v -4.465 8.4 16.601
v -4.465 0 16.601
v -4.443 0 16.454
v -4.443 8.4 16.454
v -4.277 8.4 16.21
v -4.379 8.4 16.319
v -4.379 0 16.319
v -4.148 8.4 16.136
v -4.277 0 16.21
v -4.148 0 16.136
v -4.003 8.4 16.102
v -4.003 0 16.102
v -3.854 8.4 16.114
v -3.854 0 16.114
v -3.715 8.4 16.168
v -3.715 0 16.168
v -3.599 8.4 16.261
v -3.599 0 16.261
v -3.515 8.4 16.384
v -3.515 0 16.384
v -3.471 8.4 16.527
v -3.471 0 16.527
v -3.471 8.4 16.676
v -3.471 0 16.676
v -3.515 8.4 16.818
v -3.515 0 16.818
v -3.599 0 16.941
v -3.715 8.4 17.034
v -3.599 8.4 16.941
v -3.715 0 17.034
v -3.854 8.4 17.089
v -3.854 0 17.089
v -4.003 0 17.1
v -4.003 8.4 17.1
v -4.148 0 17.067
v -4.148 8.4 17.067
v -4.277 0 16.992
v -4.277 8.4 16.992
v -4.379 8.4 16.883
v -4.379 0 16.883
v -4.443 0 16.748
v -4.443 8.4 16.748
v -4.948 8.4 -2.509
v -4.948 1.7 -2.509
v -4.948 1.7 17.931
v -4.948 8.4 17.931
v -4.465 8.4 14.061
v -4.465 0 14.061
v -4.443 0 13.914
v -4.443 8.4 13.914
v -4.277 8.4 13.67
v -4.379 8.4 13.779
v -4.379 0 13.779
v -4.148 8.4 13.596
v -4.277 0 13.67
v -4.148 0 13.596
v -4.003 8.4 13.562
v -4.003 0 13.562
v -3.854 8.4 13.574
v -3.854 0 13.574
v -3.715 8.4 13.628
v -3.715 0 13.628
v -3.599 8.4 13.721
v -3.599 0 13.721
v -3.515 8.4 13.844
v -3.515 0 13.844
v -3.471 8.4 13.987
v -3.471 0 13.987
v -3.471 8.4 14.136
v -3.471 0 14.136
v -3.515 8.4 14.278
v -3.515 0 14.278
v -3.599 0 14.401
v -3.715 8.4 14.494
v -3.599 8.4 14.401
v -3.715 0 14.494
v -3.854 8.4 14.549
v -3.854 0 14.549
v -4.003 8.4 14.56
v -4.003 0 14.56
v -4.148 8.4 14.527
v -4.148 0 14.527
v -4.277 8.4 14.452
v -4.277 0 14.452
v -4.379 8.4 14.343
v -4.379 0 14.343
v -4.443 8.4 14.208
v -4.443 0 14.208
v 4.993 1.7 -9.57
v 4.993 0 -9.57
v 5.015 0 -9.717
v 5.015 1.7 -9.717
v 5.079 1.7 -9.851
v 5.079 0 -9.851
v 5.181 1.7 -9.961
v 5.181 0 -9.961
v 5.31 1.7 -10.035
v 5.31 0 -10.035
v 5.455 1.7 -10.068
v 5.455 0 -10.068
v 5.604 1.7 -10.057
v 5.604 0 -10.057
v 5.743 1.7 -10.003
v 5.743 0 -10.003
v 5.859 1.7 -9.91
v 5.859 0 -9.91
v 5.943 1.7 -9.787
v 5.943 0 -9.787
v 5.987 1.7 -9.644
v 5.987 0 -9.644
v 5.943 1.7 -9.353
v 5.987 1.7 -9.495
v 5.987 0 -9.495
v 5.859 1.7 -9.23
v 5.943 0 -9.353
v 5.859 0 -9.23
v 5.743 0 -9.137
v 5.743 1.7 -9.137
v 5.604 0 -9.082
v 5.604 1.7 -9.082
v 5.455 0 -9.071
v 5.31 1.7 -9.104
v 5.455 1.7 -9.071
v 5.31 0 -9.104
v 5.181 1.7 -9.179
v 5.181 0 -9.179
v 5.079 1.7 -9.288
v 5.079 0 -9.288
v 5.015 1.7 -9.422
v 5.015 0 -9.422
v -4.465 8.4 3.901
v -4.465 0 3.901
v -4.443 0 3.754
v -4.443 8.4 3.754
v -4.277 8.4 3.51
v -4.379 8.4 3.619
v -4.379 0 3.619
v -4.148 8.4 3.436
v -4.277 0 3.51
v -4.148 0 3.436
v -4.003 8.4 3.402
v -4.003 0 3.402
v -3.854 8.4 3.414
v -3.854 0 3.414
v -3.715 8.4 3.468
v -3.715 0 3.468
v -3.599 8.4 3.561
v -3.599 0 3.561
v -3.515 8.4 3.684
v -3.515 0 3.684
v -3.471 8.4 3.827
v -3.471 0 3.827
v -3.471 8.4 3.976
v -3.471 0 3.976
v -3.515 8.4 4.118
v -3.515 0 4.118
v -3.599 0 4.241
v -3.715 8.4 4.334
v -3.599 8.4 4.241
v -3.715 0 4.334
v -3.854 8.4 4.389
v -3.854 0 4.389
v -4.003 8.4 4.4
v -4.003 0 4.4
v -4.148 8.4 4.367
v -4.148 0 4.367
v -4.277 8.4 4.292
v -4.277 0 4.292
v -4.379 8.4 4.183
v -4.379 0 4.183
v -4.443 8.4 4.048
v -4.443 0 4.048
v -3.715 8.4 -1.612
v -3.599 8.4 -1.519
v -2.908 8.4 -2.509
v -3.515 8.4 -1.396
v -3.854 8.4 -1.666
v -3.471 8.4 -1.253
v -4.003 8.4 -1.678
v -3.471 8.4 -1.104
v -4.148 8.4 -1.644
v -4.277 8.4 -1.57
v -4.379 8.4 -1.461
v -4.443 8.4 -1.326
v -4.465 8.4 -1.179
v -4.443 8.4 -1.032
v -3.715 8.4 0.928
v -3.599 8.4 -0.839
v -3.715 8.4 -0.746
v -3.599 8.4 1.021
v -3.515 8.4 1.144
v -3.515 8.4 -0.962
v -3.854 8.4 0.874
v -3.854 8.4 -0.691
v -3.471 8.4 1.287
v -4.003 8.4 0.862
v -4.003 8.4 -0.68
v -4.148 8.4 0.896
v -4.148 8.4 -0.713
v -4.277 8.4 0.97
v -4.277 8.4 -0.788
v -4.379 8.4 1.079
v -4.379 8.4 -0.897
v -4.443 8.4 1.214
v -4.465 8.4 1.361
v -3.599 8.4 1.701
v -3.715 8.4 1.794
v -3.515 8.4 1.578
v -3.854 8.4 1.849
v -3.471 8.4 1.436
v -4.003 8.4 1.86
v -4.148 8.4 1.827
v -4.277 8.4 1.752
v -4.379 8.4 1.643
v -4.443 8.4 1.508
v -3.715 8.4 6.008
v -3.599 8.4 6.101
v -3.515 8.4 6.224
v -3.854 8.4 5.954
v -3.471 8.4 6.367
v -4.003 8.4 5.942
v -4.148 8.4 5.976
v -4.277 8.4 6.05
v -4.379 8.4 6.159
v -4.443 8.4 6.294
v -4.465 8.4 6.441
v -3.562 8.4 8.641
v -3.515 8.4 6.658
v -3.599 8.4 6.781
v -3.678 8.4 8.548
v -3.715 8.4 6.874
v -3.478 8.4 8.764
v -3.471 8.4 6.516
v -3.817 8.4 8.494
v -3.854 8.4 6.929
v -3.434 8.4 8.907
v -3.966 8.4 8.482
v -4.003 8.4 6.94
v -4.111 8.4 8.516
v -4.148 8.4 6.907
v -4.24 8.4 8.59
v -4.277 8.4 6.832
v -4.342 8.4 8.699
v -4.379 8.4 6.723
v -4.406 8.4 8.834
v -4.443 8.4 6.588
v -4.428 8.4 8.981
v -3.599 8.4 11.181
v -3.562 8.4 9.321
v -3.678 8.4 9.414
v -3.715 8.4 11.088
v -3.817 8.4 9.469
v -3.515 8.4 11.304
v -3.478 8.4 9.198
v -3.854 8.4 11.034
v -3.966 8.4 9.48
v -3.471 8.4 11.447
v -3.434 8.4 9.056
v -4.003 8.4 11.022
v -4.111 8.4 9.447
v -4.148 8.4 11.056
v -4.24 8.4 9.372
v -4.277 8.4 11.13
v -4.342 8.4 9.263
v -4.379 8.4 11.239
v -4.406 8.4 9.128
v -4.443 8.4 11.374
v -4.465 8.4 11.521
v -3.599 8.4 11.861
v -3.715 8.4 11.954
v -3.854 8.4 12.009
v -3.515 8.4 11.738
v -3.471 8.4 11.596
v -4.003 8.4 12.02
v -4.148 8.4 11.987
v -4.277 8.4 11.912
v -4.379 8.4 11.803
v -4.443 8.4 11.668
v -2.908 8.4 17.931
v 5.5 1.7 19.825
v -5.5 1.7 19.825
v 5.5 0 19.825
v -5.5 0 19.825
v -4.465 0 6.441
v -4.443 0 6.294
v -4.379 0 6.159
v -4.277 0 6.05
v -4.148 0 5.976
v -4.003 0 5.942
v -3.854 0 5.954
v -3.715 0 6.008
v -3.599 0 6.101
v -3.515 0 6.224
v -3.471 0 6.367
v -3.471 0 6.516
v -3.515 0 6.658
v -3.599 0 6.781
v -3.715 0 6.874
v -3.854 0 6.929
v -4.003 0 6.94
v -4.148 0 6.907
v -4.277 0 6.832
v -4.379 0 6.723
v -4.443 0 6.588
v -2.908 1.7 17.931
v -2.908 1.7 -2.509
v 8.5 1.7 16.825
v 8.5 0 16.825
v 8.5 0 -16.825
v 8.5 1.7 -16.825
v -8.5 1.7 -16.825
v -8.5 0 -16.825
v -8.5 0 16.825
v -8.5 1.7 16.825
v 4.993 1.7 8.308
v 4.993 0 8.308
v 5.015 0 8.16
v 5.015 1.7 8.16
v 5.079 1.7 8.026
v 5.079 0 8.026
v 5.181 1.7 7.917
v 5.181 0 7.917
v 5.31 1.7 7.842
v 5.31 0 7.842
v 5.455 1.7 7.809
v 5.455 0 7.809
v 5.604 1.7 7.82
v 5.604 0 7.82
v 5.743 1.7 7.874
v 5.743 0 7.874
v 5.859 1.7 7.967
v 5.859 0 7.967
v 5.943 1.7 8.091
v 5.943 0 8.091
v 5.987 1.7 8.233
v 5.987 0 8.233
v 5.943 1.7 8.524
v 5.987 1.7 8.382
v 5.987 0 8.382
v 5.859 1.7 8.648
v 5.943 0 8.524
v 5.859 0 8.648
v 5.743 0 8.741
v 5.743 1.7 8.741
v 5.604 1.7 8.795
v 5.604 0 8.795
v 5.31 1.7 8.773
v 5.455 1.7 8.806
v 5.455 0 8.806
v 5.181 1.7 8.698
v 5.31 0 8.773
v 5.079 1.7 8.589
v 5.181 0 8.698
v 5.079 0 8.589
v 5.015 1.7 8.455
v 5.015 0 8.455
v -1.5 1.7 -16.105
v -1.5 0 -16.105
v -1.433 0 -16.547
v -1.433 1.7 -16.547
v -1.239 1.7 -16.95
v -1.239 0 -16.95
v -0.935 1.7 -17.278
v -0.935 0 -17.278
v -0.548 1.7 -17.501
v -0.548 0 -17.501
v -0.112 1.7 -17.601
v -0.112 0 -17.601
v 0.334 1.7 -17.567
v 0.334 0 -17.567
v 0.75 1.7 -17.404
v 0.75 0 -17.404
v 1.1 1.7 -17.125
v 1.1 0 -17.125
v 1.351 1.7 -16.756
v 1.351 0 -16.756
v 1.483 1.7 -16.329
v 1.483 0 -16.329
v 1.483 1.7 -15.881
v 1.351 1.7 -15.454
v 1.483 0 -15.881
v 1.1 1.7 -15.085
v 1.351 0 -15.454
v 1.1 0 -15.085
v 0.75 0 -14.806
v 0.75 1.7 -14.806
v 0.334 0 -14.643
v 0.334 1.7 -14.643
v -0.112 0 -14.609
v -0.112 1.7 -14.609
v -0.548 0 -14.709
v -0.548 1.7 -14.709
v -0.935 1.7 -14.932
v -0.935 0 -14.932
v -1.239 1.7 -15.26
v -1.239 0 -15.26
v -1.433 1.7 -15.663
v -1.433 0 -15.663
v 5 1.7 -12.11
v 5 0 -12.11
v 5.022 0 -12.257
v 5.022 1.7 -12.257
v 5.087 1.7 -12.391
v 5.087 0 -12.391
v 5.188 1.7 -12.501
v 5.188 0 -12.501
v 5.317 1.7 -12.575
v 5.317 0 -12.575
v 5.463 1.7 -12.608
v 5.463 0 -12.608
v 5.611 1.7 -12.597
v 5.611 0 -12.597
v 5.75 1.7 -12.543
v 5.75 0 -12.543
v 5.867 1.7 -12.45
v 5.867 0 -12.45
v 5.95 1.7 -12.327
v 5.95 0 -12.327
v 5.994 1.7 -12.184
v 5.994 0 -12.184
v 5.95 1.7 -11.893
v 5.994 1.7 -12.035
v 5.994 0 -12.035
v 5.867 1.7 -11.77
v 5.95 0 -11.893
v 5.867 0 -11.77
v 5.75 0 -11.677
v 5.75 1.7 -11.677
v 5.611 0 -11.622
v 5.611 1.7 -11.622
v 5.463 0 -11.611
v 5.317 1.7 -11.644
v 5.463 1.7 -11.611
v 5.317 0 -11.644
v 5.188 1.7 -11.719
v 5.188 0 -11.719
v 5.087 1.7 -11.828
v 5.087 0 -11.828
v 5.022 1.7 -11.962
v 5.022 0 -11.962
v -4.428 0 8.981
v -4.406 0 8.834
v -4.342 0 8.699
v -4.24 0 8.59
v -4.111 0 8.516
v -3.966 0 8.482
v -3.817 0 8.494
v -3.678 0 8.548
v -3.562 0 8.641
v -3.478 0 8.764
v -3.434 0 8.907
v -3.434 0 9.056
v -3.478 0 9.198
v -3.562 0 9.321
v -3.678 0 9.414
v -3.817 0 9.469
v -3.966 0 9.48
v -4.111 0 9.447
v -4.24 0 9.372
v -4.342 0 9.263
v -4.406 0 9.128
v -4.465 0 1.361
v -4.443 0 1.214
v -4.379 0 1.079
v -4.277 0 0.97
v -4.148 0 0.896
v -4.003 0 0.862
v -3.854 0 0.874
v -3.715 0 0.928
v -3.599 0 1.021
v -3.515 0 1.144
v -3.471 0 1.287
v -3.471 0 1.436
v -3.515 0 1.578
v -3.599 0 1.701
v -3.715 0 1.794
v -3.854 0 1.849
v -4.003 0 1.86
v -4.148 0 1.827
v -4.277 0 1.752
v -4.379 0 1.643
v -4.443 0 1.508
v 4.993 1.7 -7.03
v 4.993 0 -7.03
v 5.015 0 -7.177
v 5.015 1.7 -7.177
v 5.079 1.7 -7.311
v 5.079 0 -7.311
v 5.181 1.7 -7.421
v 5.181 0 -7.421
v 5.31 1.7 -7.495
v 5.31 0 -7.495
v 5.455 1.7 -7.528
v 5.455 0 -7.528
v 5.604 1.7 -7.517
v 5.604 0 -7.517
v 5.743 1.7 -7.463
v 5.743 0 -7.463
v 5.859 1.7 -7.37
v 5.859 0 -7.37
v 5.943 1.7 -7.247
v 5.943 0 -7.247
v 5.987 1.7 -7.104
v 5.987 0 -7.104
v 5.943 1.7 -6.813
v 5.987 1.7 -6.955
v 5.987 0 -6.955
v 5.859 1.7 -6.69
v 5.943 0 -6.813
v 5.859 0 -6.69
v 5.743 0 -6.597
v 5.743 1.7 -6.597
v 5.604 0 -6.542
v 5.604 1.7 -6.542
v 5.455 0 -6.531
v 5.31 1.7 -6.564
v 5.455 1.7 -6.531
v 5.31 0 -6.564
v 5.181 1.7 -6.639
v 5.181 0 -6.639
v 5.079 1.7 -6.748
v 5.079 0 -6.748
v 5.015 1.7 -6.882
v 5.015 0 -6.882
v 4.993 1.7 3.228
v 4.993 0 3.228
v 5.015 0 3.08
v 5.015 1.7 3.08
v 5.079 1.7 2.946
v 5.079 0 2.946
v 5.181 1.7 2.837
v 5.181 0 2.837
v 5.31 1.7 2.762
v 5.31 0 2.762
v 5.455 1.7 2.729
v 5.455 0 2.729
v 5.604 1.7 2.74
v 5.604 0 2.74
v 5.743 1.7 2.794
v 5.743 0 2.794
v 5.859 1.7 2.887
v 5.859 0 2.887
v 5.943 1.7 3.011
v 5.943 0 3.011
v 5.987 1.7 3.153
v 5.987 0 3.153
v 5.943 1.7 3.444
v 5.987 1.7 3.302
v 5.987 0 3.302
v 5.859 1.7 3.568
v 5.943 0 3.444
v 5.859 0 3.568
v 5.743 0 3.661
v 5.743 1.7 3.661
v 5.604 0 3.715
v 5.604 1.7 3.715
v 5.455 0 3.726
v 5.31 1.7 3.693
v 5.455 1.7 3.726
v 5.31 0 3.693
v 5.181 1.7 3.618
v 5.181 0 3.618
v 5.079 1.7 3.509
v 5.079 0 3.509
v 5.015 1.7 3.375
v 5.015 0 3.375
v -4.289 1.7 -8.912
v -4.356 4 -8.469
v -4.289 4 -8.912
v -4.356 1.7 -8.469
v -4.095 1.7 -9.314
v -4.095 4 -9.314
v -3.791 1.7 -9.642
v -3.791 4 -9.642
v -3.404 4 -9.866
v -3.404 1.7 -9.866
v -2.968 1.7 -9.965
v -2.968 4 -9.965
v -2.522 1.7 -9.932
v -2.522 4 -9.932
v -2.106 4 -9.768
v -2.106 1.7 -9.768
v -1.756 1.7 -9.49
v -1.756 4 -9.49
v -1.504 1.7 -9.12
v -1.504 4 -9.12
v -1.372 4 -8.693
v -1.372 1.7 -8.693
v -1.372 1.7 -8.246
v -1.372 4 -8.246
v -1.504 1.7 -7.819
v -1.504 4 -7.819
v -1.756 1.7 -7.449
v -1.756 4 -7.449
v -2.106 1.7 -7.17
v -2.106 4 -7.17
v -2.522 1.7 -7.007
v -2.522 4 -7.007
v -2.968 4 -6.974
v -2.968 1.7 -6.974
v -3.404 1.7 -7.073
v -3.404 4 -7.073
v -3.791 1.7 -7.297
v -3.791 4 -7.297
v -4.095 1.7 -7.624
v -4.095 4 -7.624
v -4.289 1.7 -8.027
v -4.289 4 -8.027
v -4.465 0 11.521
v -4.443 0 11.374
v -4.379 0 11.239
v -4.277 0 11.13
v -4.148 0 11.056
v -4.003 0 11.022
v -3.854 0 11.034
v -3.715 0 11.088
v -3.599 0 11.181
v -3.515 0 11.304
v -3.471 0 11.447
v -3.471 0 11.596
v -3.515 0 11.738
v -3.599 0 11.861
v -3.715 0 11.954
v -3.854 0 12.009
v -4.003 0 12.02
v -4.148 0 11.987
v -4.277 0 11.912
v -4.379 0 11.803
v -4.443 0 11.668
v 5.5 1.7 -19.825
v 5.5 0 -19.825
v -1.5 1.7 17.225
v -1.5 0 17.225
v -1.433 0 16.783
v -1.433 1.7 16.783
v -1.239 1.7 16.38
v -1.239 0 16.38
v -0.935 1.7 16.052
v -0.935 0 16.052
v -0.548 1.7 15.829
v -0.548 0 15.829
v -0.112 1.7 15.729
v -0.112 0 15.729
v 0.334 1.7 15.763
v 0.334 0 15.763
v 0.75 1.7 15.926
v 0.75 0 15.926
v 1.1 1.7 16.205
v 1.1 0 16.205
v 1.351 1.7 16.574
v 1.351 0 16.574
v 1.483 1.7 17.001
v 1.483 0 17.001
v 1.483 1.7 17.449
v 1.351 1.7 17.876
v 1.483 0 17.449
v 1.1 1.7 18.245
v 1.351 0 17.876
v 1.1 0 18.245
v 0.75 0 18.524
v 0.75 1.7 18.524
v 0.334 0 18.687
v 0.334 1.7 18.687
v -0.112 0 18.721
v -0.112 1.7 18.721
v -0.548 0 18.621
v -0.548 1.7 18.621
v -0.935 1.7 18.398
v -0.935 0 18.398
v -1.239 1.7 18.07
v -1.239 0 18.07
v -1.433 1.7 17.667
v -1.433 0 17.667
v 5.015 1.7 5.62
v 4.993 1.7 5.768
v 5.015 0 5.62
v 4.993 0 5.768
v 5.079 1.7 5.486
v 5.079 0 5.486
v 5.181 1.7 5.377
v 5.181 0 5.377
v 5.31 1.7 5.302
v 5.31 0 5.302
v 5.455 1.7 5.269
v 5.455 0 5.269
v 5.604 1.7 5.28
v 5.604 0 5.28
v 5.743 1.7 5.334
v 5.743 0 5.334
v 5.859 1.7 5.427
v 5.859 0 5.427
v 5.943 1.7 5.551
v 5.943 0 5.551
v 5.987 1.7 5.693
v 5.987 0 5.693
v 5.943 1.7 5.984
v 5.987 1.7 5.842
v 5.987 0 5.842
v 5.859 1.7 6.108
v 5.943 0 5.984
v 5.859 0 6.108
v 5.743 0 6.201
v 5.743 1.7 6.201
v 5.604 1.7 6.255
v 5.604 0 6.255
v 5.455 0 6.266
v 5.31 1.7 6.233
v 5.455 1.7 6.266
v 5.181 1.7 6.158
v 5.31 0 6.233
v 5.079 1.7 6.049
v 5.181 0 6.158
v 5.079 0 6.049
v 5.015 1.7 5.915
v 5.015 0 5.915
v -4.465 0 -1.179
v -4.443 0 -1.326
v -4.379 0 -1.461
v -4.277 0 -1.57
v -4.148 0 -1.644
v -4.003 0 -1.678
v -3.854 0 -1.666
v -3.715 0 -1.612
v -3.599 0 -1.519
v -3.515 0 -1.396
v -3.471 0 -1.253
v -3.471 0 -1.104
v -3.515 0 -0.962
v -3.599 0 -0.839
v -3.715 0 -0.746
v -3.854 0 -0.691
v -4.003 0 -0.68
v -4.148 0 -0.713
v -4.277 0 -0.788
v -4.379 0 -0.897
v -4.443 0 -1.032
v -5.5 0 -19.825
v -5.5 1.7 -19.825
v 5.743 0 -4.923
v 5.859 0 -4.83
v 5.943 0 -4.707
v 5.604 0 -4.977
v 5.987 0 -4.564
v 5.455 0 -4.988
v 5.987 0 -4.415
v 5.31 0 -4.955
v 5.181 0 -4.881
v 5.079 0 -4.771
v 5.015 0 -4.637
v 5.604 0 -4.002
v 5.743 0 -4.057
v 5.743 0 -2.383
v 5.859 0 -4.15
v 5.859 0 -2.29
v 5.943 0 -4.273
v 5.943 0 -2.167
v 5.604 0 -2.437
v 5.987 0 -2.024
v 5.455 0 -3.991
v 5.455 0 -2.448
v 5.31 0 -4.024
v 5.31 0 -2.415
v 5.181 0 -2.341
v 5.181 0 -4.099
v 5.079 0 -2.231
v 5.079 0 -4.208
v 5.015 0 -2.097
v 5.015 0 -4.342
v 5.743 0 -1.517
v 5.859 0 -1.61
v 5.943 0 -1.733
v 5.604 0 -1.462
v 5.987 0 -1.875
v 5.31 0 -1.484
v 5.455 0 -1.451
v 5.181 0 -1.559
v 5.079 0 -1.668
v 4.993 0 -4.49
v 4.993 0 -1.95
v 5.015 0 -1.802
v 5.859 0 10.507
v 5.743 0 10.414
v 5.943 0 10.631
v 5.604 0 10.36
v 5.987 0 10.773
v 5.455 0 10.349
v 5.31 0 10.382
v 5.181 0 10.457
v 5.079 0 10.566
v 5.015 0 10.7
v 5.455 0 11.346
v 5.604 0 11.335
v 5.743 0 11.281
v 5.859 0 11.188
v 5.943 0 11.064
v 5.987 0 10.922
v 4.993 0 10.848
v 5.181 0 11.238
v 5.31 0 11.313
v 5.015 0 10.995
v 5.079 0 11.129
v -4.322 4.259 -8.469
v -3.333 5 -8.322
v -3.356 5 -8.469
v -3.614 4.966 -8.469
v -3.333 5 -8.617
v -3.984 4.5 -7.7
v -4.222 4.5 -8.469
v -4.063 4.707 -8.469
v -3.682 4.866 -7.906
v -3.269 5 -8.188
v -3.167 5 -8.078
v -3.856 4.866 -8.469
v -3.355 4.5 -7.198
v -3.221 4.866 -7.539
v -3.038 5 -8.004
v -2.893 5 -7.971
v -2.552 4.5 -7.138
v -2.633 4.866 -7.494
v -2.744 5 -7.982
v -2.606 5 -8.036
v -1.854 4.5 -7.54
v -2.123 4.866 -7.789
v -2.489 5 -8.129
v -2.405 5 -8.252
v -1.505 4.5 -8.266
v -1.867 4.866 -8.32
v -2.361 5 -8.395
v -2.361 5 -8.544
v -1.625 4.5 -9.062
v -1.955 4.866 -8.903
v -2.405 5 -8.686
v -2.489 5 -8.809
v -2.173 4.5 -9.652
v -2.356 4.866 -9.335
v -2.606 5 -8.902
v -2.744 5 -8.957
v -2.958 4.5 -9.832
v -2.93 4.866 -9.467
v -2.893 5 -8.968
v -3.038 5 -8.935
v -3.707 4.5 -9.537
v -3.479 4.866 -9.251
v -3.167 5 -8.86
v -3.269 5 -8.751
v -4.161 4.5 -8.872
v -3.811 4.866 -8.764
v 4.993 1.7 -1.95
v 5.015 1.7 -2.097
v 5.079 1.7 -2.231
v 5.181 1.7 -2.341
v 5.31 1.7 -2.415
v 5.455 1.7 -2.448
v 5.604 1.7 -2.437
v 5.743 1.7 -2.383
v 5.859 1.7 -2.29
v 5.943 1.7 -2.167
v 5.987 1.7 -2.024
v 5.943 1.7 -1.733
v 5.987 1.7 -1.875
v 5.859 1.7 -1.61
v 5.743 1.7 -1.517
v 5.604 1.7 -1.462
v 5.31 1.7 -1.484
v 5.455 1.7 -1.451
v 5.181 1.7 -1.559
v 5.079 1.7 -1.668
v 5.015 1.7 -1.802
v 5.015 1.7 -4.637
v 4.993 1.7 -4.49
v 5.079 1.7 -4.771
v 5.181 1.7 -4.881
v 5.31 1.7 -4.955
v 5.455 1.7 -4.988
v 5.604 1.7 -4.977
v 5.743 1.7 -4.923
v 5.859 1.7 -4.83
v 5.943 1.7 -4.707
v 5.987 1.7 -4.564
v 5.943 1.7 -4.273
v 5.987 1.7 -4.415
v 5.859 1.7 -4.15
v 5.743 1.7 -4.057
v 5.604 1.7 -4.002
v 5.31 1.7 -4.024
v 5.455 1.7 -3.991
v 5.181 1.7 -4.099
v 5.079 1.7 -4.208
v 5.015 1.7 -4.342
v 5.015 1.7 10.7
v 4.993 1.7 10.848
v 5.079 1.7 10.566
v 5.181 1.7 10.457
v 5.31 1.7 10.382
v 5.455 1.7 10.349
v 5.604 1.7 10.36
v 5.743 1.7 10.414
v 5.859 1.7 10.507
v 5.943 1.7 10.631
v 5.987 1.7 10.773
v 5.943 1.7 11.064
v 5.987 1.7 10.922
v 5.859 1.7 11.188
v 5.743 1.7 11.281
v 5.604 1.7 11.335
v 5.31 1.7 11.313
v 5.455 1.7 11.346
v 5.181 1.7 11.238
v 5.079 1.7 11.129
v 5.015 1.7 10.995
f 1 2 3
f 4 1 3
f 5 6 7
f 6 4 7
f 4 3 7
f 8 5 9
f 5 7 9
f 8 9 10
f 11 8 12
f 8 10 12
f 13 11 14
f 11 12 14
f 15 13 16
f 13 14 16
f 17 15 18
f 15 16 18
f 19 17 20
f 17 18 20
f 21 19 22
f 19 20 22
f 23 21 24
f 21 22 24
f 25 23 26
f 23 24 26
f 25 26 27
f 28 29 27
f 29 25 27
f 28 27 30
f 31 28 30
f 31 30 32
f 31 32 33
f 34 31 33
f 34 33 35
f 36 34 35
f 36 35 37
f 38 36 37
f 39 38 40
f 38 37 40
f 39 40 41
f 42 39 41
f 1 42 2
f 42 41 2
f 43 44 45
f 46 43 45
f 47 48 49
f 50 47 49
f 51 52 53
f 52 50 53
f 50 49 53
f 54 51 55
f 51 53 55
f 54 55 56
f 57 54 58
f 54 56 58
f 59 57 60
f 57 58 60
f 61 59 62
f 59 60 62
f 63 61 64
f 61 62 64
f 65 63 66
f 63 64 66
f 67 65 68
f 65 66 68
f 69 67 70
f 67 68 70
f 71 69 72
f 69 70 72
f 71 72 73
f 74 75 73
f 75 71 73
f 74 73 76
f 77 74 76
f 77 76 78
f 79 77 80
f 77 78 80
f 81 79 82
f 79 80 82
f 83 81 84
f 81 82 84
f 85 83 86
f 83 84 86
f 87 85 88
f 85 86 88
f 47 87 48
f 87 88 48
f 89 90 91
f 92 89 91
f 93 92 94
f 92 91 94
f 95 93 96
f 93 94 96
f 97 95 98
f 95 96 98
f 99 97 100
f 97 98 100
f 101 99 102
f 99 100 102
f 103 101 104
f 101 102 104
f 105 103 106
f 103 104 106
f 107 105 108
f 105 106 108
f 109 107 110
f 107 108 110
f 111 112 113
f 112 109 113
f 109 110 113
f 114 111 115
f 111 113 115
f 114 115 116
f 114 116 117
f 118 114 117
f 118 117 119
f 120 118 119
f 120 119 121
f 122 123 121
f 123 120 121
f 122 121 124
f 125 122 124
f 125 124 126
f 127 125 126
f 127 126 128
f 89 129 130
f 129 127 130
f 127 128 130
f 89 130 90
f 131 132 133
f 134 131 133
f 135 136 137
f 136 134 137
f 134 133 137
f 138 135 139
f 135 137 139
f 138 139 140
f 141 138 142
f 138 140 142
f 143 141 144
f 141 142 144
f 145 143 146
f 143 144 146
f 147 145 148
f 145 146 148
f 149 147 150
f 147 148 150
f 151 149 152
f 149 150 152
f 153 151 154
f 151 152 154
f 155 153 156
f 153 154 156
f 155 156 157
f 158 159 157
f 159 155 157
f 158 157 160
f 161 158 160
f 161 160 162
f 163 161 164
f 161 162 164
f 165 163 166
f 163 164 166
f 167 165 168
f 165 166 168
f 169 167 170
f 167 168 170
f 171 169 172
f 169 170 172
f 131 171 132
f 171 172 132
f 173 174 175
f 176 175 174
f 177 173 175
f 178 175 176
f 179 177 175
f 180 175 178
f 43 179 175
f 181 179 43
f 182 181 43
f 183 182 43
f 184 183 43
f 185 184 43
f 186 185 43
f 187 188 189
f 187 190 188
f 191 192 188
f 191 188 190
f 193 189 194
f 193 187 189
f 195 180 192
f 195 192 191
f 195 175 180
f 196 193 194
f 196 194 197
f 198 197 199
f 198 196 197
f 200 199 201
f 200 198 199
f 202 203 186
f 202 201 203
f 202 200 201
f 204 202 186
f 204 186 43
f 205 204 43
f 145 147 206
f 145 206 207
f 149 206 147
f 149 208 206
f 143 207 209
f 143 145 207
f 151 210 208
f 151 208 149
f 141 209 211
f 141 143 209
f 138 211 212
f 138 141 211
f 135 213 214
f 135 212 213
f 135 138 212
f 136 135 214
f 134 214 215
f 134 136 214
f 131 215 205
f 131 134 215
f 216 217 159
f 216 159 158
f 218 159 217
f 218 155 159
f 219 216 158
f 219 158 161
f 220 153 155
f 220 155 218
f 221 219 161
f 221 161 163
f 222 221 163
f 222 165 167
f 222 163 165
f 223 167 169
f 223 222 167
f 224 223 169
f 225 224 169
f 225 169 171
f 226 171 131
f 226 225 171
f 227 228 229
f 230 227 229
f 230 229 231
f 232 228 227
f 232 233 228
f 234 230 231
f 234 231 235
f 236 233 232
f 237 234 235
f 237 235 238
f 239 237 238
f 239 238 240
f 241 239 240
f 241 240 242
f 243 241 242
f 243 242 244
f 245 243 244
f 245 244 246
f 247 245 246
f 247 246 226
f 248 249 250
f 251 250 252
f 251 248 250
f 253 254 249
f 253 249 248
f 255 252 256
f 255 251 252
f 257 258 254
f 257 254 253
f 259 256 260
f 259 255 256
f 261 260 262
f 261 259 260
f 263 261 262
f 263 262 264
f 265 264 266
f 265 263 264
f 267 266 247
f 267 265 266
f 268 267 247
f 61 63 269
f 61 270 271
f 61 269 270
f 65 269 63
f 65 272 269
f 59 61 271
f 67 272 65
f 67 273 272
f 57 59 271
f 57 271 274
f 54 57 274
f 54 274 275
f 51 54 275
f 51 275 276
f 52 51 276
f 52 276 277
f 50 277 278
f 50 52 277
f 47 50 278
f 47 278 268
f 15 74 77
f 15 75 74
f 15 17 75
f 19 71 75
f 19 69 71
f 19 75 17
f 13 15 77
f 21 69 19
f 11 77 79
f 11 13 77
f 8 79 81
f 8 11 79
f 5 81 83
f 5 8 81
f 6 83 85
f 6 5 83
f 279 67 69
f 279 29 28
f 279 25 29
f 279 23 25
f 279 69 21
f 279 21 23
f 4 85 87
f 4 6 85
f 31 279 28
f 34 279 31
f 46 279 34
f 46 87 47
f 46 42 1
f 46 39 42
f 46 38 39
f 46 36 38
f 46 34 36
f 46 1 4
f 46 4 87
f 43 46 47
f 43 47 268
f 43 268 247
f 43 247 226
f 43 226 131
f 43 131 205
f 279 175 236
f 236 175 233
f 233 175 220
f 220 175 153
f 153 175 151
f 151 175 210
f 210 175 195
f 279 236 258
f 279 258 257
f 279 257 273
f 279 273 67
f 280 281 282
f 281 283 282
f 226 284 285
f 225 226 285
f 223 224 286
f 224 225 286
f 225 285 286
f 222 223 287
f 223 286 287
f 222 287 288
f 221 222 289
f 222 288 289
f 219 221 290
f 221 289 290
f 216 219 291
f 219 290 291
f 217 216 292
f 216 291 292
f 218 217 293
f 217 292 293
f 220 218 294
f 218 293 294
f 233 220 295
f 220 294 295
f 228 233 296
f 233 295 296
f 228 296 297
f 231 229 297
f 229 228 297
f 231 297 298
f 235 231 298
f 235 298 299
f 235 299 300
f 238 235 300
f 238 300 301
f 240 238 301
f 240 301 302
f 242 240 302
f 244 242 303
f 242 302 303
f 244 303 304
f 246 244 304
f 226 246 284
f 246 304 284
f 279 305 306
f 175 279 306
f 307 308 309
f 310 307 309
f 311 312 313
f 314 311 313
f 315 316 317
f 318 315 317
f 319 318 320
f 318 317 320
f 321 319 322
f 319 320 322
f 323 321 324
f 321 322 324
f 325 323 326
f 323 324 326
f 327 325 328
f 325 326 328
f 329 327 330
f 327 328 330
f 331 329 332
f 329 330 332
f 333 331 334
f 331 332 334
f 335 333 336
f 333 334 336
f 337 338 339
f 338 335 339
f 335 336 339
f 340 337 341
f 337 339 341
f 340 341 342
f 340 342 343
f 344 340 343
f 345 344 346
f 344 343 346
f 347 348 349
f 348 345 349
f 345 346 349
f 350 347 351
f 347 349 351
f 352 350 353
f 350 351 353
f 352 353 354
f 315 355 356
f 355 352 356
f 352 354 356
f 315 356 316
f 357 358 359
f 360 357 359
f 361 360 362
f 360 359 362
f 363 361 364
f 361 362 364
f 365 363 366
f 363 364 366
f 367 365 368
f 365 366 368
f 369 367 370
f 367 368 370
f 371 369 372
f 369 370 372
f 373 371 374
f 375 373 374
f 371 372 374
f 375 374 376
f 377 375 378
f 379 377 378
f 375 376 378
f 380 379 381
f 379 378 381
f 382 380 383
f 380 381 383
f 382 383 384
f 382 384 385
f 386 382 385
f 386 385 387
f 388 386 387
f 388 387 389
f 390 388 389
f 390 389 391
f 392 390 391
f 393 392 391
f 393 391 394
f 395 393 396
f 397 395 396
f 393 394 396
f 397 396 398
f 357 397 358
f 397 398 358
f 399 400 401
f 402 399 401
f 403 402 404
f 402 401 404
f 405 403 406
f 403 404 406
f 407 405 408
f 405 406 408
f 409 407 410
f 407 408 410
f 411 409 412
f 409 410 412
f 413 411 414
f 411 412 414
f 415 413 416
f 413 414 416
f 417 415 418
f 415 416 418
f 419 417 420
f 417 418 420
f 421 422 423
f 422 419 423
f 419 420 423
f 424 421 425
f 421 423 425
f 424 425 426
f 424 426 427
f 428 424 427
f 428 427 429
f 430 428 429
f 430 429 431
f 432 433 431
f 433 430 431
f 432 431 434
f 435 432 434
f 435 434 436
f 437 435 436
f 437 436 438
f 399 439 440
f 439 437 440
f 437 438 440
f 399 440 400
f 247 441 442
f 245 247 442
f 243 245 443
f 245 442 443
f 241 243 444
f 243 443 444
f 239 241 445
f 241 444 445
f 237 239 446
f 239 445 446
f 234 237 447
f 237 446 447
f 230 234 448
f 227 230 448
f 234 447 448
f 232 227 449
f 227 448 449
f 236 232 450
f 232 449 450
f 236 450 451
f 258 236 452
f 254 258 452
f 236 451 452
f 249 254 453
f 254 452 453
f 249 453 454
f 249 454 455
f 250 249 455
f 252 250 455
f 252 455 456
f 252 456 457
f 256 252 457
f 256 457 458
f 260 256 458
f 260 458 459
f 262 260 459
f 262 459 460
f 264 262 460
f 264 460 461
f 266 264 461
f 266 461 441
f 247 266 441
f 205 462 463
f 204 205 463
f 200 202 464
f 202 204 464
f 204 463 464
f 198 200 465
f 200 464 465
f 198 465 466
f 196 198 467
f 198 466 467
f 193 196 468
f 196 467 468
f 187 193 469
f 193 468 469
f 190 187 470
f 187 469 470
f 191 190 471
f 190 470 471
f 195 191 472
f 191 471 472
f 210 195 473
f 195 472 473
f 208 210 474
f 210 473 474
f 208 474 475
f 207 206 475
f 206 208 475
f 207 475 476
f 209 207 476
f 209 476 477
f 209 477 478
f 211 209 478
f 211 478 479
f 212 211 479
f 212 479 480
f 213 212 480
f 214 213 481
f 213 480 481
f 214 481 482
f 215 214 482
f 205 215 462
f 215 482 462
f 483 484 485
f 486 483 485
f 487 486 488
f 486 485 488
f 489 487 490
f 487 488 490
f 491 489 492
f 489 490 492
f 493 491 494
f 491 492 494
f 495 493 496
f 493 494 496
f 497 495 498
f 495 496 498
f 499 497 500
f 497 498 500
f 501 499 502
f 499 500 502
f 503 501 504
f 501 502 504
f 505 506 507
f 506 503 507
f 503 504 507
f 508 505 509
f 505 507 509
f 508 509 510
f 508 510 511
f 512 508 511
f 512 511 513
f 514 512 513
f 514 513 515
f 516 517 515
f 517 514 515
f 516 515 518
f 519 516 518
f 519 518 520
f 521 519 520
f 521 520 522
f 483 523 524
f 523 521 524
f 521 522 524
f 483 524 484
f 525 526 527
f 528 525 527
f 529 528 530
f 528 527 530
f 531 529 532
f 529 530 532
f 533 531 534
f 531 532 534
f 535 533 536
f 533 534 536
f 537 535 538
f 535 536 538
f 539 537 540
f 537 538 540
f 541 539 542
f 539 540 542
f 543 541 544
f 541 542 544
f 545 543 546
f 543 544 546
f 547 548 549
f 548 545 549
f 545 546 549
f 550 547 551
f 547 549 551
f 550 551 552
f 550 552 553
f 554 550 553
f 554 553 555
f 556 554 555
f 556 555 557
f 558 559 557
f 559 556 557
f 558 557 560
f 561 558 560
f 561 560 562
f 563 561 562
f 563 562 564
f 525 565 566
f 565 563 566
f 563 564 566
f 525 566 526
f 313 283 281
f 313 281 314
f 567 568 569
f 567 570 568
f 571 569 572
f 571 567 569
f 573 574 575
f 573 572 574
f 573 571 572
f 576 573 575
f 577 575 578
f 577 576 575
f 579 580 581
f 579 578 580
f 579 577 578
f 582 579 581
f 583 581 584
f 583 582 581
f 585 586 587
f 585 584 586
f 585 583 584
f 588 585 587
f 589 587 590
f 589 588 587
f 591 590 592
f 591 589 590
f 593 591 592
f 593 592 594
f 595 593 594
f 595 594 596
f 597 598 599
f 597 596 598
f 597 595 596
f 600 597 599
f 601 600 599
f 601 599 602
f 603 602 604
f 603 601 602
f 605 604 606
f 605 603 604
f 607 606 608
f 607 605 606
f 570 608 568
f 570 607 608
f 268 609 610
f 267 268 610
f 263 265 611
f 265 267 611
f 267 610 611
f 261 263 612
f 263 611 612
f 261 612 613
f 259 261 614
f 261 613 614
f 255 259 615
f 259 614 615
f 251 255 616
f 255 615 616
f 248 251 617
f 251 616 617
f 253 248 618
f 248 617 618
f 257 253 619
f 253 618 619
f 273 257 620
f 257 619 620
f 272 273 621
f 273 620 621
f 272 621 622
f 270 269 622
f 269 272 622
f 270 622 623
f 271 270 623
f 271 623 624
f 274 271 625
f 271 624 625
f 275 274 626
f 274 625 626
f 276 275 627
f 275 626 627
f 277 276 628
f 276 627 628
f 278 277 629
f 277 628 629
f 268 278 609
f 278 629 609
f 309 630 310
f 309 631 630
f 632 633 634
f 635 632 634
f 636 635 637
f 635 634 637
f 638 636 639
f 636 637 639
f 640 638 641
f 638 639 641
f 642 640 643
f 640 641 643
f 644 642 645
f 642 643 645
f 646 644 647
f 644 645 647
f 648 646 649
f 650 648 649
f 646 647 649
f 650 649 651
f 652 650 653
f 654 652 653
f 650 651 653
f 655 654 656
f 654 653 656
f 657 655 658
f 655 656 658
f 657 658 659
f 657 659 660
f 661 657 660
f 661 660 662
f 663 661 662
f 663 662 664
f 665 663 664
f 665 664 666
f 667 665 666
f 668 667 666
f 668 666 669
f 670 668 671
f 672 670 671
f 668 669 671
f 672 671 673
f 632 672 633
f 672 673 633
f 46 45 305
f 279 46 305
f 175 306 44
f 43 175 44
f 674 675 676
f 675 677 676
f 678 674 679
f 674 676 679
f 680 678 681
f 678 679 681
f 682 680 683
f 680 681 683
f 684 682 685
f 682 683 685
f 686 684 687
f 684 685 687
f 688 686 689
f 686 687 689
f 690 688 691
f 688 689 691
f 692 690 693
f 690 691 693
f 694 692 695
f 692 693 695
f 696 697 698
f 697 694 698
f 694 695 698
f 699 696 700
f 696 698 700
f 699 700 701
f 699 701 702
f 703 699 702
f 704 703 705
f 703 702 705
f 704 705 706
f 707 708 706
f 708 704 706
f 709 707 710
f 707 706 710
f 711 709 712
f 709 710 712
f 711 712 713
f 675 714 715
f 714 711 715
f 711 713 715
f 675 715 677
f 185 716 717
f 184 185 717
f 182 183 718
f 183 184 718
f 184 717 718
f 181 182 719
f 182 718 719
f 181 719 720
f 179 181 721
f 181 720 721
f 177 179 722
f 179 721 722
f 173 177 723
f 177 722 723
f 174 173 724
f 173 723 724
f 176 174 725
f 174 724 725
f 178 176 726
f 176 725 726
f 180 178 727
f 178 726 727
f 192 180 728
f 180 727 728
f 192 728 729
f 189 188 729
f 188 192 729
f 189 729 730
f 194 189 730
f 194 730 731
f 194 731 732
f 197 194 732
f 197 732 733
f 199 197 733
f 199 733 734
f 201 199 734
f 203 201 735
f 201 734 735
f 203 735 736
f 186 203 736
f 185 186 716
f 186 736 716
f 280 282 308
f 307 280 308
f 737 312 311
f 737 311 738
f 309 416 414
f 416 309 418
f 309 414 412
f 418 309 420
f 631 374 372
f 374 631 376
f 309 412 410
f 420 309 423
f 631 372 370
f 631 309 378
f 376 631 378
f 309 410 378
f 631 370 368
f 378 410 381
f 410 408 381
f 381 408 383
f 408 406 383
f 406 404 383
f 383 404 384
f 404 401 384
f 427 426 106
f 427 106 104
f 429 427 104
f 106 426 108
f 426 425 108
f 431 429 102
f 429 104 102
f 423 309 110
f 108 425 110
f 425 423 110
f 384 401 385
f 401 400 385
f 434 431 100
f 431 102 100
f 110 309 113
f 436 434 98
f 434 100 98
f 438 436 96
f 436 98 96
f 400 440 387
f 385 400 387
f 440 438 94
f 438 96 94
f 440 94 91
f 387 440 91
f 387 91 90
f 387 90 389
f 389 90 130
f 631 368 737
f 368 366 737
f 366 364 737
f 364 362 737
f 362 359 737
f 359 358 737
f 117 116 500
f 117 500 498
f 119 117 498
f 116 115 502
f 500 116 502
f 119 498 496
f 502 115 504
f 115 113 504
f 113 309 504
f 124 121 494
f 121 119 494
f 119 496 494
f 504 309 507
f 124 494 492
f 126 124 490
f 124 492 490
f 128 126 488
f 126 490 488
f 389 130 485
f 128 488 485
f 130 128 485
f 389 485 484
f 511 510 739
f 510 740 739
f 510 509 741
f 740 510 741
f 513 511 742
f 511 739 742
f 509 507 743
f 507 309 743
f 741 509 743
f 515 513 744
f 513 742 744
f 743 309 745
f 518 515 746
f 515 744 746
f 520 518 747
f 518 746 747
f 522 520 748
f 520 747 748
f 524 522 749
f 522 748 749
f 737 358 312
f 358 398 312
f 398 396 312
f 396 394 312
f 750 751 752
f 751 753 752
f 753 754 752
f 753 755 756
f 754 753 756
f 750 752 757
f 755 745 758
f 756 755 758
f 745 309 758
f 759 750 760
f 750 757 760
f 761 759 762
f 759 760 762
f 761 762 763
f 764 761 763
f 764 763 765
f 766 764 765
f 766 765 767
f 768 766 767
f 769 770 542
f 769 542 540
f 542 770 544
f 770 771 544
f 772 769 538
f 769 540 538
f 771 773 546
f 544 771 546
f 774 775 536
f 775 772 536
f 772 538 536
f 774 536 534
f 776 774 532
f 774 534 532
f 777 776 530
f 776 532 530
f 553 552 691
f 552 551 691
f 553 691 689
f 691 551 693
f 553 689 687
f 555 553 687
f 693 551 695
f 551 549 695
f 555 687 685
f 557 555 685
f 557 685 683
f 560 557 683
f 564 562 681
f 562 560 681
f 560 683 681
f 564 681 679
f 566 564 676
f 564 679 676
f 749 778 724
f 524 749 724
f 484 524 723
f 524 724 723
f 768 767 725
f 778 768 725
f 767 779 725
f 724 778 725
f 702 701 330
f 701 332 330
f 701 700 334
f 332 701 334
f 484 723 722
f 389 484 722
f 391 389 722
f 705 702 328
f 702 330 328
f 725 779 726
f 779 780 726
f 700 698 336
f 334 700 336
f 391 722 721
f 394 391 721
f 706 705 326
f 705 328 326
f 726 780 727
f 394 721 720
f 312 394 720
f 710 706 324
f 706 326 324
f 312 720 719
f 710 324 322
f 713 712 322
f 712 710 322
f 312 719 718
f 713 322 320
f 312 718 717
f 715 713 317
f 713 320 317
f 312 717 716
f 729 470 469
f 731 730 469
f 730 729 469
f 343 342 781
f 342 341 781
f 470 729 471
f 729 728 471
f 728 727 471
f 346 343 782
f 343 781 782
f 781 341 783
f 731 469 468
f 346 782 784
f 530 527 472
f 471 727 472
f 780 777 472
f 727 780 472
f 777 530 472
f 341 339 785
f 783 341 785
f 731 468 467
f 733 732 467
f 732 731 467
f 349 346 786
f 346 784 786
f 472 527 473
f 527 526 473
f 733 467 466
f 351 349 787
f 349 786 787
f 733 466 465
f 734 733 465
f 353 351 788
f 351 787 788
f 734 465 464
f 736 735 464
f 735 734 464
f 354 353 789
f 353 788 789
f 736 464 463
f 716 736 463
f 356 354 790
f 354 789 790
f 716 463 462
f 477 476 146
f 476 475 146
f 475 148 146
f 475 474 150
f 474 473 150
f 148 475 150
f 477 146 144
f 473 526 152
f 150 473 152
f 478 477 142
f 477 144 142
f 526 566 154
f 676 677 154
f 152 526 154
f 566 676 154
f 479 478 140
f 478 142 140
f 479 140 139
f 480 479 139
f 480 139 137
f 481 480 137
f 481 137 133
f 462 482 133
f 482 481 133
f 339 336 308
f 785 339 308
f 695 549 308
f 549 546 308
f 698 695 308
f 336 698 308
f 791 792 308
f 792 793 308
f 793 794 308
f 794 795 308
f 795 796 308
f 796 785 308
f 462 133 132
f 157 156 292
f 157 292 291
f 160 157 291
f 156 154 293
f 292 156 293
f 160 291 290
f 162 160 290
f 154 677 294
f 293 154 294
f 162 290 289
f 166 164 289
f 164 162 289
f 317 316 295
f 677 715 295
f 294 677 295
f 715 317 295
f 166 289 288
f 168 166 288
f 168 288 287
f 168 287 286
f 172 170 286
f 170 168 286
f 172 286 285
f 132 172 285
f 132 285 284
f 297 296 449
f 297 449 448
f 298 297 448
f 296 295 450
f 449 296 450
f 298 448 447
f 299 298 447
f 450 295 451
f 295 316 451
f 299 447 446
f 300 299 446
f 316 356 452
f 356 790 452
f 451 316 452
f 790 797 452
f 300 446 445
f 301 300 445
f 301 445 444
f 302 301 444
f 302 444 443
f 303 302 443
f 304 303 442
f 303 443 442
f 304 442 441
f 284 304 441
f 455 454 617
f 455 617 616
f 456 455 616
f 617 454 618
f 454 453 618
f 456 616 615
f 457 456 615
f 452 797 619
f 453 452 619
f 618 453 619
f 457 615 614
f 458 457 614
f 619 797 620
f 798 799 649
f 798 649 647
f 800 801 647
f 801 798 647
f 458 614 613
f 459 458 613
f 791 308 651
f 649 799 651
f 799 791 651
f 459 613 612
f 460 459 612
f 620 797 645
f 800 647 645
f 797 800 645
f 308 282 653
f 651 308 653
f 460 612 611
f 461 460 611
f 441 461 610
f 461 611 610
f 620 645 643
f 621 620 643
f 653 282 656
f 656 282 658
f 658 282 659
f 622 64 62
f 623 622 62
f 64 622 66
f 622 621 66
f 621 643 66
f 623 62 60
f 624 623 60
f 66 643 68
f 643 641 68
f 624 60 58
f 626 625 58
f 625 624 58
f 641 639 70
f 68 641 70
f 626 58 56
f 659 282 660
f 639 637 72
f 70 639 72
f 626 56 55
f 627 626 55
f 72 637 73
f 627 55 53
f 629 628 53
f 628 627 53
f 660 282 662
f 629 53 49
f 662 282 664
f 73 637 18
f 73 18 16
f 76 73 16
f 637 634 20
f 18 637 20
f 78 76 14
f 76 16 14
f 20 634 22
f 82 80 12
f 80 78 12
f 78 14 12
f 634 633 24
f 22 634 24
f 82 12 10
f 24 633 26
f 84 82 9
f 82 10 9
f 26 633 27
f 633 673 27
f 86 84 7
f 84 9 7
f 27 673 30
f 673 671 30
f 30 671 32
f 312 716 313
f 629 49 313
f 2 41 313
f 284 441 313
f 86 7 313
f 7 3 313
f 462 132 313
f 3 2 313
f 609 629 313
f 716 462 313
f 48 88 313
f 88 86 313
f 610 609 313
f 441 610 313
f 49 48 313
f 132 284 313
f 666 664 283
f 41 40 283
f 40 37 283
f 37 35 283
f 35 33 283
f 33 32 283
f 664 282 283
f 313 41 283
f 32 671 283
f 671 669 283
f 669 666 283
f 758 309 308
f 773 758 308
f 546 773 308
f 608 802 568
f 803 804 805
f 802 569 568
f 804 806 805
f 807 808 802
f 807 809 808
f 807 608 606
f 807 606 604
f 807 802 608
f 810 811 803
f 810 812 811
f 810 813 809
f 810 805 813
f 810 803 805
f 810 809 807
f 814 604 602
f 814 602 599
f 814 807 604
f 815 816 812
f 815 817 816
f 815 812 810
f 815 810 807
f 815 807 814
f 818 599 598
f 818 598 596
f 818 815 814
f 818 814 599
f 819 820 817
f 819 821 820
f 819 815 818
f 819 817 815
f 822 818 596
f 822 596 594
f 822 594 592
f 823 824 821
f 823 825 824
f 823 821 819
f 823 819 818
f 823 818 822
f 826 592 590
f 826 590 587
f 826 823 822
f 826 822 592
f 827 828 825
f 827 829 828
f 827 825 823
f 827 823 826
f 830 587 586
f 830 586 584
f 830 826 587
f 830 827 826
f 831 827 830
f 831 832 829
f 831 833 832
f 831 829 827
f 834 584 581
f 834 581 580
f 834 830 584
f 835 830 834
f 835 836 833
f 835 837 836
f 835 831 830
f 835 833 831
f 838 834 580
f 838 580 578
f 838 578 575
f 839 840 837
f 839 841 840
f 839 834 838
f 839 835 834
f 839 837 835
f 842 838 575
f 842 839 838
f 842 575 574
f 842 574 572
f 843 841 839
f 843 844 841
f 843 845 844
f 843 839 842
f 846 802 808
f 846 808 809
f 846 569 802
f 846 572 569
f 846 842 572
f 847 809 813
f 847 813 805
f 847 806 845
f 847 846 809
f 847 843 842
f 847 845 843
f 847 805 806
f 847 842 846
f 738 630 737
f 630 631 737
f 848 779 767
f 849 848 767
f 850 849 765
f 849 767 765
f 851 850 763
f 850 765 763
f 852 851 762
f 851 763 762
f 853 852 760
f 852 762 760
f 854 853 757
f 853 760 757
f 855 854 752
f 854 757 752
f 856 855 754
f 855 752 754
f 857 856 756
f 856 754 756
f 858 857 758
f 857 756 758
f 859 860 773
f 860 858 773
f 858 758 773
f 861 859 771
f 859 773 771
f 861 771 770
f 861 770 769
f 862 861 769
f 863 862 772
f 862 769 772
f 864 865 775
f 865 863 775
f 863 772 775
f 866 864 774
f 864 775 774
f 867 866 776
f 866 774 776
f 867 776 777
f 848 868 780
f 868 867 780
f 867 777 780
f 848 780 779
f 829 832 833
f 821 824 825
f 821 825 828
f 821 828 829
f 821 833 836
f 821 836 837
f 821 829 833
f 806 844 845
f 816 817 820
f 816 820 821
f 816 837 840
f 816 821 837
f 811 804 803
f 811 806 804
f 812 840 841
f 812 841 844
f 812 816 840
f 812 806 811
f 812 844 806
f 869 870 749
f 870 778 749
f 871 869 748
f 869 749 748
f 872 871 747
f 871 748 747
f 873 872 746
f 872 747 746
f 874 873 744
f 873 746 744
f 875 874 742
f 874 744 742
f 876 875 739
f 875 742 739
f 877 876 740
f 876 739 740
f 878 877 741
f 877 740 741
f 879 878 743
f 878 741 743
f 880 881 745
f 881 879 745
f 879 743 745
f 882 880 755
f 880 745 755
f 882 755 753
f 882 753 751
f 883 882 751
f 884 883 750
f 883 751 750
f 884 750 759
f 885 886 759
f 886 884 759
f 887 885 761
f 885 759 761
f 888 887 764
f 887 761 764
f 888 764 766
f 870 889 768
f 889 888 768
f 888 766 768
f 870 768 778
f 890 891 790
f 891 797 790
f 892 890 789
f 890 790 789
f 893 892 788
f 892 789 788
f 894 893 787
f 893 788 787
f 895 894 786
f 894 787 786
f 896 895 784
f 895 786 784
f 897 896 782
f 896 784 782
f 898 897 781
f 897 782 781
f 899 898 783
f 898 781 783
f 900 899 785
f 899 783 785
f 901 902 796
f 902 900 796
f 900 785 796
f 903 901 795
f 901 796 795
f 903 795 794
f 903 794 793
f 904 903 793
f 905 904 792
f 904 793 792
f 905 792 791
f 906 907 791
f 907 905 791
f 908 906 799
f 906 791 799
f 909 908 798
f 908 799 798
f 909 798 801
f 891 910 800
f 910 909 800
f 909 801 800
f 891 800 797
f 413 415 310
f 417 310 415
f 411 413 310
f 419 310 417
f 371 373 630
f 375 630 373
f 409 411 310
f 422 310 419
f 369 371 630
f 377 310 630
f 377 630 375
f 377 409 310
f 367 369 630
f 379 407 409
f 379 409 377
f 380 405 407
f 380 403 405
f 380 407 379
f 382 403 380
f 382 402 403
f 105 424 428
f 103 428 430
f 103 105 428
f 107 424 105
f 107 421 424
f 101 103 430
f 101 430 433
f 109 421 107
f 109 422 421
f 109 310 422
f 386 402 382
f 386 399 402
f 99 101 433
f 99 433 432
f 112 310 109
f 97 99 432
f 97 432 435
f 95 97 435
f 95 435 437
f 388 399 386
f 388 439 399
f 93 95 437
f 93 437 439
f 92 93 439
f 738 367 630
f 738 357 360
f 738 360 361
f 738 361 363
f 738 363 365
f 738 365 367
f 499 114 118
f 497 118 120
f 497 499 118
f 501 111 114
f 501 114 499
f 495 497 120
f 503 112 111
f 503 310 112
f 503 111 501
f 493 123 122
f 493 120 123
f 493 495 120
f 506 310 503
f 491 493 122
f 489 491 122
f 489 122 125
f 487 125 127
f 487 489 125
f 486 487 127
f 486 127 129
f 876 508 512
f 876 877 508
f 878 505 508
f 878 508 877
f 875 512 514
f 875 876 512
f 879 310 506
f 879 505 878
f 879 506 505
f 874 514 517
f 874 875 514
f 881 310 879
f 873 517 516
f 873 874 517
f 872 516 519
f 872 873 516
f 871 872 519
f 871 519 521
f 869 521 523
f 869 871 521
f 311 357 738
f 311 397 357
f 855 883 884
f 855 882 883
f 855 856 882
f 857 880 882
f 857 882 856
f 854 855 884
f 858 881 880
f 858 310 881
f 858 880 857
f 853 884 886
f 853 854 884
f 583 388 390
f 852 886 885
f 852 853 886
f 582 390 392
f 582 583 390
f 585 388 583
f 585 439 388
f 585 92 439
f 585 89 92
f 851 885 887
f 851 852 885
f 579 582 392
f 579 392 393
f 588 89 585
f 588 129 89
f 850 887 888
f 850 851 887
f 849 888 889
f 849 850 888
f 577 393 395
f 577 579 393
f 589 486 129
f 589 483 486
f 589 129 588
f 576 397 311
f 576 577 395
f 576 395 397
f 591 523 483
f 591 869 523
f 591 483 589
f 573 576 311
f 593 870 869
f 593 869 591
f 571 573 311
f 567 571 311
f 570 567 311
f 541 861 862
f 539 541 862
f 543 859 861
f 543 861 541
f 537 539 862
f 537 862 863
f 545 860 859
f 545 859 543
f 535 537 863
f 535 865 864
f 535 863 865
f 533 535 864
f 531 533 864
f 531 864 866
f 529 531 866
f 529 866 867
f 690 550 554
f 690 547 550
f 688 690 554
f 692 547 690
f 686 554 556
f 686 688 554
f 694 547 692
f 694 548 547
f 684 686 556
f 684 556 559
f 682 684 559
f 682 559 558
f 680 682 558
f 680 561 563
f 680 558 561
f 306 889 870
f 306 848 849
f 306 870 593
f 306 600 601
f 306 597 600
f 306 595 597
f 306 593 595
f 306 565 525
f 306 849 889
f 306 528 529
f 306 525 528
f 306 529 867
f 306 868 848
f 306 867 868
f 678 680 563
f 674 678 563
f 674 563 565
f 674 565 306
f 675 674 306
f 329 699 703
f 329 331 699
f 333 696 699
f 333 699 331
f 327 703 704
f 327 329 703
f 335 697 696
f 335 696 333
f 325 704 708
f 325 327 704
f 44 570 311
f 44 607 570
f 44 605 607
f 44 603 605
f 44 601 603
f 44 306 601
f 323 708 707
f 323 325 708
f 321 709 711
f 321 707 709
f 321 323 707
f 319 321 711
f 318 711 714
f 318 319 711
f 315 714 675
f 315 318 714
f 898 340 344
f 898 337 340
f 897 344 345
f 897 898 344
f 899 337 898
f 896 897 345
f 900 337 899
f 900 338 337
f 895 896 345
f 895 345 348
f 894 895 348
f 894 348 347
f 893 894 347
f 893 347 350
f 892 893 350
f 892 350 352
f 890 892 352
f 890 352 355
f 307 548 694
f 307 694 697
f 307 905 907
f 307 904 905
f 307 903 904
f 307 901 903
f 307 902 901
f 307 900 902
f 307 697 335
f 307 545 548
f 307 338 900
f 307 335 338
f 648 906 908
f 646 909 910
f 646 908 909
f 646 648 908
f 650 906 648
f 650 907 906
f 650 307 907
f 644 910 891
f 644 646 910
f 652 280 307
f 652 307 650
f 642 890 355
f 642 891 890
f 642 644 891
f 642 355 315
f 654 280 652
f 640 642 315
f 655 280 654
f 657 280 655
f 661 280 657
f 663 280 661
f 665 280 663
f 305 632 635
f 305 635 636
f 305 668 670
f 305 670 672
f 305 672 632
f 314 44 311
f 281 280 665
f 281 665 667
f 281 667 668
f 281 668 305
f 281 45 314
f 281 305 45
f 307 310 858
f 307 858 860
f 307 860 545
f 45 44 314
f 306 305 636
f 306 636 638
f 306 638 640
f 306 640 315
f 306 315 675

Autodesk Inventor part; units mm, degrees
ref_plane "YZ Plane" through (0, 0, 0) normal (1, 0, 0) x (0, 1, 0)
ref_plane "XZ Plane" through (0, 0, 0) normal (0, 1, 0) x (-1, 0, 0)
ref_plane "XY Plane" through (0, 0, 0) normal (0, 0, 1) x (1, 0, 0)
sketch "Sketch1" plane through (0, 0, 0) normal (0, 1, 0) x (-1, 0, 0)
  line L0 (5.5, 19.825) -> (-5.5, 19.825)
  line L1 (-8.5, 16.825) -> (-8.5, -16.825)
  line L2 (-5.5, -19.825) -> (5.5, -19.825)
  line L3 (8.5, -16.825) -> (8.5, 16.825)
  line L4 (8.5, 19.825) -> (-8.5, -19.825) construction
  line L5 (-8.5, 19.825) -> (8.5, -19.825) construction
  line L6 (-5.5, 19.825) -> (-8.5, 16.825)
  line L7 (5.5, 19.825) -> (8.5, 16.825)
  line L8 (8.5, -16.825) -> (5.5, -19.825)
  line L9 (-5.5, -19.825) -> (-8.5, -16.825)
  circle A0 centre (3.9654, 16.6011) radius 0.5
  circle A1 centre (3.9654, 14.0611) radius 0.5
  circle A2 centre (3.9654, 11.5211) radius 0.5
  circle A3 centre (3.9654, 6.4411) radius 0.5
  circle A4 centre (3.9654, 3.9011) radius 0.5
  circle A5 centre (3.9654, 1.3611) radius 0.5
  circle A6 centre (3.9654, -1.1789) radius 0.5
  line L10 (4.9485, 17.9314) -> (2.9084, 17.9314)
  line L11 (2.9084, 17.9314) -> (2.9084, -2.5092)
  line L12 (2.9084, -2.5092) -> (4.9485, -2.5092)
  line L13 (4.9485, -2.5092) -> (4.9485, 17.9314)
  circle A7 centre (2.8556, -8.4694) radius 1.5
  circle A8 centre (-5.4926, 10.8475) radius 0.5
  circle A9 centre (-5.4926, 8.3075) radius 0.5
  circle A10 centre (-5.4926, 5.7675) radius 0.5
  circle A11 centre (-5.4926, 3.2275) radius 0.5
  circle A12 centre (-5.4926, -1.9498) radius 0.5
  circle A13 centre (-5.4926, -4.4898) radius 0.5
  circle A14 centre (-5.4926, -7.0298) radius 0.5
  circle A15 centre (-5.4926, -9.5698) radius 0.5
  circle A16 centre (-5.5, -12.1098) radius 0.5
  circle A17 centre (0, -16.105) radius 1.5
  circle A18 centre (0, 17.225) radius 1.5
  circle A19 centre (3.9285, 8.9811) radius 0.5
  point P0 (0, 0)
  dimension "d0" = 17
  dimension "d1" = 39.65
  dimension "d2" = 3
  dimension "d3" = 3
  dimension "d4" = 3
  dimension "d5" = 3
  dimension "d6" = 3
  dimension "d7" = 3
  dimension "d8" = 3
  dimension "d9" = 3
  dimension "d10" = 1
  dimension "d11" = 1
  dimension "d12" = 1
  dimension "d13" = 1
  dimension "d14" = 1
  dimension "d15" = 1
  dimension "d16" = 1
  dimension "d17" = 2.54
  dimension "d18" = 2.54
  dimension "d19" = 2.54
  dimension "d20" = 2.54
  dimension "d21" = 2.54
  dimension "d23" = 3
  dimension "d24" = 1
  dimension "d25" = 1
  dimension "d26" = 1
  dimension "d27" = 1
  dimension "d28" = 2.54
  dimension "d29" = 2.54
  dimension "d30" = 2.54
  dimension "d31" = 1
  dimension "d32" = 1
  dimension "d33" = 1
  dimension "d34" = 1
  dimension "d35" = 2.54
  dimension "d36" = 2.54
  dimension "d37" = 2.54
  dimension "d39" = 2.54
  dimension "d51" = 3
  dimension "d52" = 3
  dimension "d53" = 2.6
  dimension "d54" = 3.72
  dimension "d59" = 33.33
  dimension "d60" = 1
  dimension "d61" = 2.54
  dimension "d62" = 2.54
  dimension "d63" = 1.3303
  dimension "d64" = 1.3303
extrude "Extrusion2" add sketch "Sketch1" along normal blind 8.4 contours L13 L12 L11 L10 | A19
extrude "Extrusion3" add sketch "Sketch1" along normal blind 5 contours A7
extrude "Extrusion4" cut sketch "Sketch1" along normal blind 1.7 contours L7 L3 L8 L2 L9 L1 L6 L0 | A17 | A18
extrude "Extrusion5" add sketch "Sketch1" along normal blind 1.7 contours L7 L3 L8 L2 L9 L1 L6 L0 | A17 | A18
fillet "Fillet1" radius 1 1 edges at (-1.3556, 5, -8.4694)
sketch "Sketch2" plane through (0, 1.7, 0) normal (0, 1, 0) x (1, 0, 0)
  line L0 (-0.041, -10.2921) -> (-0.041, 12.3756) construction
  line L1 (-0.041, 12.3756) -> (3.5412, 12.3756) construction
  line L2 (3.5412, 12.3756) -> (3.5412, -10.2921) construction
  line L3 (3.5412, -10.2921) -> (-0.041, -10.2921) construction
  point P0 (0, 0)
extrude "Extrusion6" cut sketch "Sketch1" against normal blind 10 contours A17 | A18
extrude "Extrusion7" cut sketch "Sketch1" along normal through all contours A17 | A18
extrude "Extrusion8" cut sketch "Sketch1" along normal up to next contours A19
equation "\"d3\" = d2"
equation "\"d4\" = d2"
equation "\"d5\" = d4"
equation "\"d6\" = d2"
equation "\"d7\" = d6"
equation "\"d8\" = d2"
equation "\"d9\" = d8"
properties part number "Driver TPA"
